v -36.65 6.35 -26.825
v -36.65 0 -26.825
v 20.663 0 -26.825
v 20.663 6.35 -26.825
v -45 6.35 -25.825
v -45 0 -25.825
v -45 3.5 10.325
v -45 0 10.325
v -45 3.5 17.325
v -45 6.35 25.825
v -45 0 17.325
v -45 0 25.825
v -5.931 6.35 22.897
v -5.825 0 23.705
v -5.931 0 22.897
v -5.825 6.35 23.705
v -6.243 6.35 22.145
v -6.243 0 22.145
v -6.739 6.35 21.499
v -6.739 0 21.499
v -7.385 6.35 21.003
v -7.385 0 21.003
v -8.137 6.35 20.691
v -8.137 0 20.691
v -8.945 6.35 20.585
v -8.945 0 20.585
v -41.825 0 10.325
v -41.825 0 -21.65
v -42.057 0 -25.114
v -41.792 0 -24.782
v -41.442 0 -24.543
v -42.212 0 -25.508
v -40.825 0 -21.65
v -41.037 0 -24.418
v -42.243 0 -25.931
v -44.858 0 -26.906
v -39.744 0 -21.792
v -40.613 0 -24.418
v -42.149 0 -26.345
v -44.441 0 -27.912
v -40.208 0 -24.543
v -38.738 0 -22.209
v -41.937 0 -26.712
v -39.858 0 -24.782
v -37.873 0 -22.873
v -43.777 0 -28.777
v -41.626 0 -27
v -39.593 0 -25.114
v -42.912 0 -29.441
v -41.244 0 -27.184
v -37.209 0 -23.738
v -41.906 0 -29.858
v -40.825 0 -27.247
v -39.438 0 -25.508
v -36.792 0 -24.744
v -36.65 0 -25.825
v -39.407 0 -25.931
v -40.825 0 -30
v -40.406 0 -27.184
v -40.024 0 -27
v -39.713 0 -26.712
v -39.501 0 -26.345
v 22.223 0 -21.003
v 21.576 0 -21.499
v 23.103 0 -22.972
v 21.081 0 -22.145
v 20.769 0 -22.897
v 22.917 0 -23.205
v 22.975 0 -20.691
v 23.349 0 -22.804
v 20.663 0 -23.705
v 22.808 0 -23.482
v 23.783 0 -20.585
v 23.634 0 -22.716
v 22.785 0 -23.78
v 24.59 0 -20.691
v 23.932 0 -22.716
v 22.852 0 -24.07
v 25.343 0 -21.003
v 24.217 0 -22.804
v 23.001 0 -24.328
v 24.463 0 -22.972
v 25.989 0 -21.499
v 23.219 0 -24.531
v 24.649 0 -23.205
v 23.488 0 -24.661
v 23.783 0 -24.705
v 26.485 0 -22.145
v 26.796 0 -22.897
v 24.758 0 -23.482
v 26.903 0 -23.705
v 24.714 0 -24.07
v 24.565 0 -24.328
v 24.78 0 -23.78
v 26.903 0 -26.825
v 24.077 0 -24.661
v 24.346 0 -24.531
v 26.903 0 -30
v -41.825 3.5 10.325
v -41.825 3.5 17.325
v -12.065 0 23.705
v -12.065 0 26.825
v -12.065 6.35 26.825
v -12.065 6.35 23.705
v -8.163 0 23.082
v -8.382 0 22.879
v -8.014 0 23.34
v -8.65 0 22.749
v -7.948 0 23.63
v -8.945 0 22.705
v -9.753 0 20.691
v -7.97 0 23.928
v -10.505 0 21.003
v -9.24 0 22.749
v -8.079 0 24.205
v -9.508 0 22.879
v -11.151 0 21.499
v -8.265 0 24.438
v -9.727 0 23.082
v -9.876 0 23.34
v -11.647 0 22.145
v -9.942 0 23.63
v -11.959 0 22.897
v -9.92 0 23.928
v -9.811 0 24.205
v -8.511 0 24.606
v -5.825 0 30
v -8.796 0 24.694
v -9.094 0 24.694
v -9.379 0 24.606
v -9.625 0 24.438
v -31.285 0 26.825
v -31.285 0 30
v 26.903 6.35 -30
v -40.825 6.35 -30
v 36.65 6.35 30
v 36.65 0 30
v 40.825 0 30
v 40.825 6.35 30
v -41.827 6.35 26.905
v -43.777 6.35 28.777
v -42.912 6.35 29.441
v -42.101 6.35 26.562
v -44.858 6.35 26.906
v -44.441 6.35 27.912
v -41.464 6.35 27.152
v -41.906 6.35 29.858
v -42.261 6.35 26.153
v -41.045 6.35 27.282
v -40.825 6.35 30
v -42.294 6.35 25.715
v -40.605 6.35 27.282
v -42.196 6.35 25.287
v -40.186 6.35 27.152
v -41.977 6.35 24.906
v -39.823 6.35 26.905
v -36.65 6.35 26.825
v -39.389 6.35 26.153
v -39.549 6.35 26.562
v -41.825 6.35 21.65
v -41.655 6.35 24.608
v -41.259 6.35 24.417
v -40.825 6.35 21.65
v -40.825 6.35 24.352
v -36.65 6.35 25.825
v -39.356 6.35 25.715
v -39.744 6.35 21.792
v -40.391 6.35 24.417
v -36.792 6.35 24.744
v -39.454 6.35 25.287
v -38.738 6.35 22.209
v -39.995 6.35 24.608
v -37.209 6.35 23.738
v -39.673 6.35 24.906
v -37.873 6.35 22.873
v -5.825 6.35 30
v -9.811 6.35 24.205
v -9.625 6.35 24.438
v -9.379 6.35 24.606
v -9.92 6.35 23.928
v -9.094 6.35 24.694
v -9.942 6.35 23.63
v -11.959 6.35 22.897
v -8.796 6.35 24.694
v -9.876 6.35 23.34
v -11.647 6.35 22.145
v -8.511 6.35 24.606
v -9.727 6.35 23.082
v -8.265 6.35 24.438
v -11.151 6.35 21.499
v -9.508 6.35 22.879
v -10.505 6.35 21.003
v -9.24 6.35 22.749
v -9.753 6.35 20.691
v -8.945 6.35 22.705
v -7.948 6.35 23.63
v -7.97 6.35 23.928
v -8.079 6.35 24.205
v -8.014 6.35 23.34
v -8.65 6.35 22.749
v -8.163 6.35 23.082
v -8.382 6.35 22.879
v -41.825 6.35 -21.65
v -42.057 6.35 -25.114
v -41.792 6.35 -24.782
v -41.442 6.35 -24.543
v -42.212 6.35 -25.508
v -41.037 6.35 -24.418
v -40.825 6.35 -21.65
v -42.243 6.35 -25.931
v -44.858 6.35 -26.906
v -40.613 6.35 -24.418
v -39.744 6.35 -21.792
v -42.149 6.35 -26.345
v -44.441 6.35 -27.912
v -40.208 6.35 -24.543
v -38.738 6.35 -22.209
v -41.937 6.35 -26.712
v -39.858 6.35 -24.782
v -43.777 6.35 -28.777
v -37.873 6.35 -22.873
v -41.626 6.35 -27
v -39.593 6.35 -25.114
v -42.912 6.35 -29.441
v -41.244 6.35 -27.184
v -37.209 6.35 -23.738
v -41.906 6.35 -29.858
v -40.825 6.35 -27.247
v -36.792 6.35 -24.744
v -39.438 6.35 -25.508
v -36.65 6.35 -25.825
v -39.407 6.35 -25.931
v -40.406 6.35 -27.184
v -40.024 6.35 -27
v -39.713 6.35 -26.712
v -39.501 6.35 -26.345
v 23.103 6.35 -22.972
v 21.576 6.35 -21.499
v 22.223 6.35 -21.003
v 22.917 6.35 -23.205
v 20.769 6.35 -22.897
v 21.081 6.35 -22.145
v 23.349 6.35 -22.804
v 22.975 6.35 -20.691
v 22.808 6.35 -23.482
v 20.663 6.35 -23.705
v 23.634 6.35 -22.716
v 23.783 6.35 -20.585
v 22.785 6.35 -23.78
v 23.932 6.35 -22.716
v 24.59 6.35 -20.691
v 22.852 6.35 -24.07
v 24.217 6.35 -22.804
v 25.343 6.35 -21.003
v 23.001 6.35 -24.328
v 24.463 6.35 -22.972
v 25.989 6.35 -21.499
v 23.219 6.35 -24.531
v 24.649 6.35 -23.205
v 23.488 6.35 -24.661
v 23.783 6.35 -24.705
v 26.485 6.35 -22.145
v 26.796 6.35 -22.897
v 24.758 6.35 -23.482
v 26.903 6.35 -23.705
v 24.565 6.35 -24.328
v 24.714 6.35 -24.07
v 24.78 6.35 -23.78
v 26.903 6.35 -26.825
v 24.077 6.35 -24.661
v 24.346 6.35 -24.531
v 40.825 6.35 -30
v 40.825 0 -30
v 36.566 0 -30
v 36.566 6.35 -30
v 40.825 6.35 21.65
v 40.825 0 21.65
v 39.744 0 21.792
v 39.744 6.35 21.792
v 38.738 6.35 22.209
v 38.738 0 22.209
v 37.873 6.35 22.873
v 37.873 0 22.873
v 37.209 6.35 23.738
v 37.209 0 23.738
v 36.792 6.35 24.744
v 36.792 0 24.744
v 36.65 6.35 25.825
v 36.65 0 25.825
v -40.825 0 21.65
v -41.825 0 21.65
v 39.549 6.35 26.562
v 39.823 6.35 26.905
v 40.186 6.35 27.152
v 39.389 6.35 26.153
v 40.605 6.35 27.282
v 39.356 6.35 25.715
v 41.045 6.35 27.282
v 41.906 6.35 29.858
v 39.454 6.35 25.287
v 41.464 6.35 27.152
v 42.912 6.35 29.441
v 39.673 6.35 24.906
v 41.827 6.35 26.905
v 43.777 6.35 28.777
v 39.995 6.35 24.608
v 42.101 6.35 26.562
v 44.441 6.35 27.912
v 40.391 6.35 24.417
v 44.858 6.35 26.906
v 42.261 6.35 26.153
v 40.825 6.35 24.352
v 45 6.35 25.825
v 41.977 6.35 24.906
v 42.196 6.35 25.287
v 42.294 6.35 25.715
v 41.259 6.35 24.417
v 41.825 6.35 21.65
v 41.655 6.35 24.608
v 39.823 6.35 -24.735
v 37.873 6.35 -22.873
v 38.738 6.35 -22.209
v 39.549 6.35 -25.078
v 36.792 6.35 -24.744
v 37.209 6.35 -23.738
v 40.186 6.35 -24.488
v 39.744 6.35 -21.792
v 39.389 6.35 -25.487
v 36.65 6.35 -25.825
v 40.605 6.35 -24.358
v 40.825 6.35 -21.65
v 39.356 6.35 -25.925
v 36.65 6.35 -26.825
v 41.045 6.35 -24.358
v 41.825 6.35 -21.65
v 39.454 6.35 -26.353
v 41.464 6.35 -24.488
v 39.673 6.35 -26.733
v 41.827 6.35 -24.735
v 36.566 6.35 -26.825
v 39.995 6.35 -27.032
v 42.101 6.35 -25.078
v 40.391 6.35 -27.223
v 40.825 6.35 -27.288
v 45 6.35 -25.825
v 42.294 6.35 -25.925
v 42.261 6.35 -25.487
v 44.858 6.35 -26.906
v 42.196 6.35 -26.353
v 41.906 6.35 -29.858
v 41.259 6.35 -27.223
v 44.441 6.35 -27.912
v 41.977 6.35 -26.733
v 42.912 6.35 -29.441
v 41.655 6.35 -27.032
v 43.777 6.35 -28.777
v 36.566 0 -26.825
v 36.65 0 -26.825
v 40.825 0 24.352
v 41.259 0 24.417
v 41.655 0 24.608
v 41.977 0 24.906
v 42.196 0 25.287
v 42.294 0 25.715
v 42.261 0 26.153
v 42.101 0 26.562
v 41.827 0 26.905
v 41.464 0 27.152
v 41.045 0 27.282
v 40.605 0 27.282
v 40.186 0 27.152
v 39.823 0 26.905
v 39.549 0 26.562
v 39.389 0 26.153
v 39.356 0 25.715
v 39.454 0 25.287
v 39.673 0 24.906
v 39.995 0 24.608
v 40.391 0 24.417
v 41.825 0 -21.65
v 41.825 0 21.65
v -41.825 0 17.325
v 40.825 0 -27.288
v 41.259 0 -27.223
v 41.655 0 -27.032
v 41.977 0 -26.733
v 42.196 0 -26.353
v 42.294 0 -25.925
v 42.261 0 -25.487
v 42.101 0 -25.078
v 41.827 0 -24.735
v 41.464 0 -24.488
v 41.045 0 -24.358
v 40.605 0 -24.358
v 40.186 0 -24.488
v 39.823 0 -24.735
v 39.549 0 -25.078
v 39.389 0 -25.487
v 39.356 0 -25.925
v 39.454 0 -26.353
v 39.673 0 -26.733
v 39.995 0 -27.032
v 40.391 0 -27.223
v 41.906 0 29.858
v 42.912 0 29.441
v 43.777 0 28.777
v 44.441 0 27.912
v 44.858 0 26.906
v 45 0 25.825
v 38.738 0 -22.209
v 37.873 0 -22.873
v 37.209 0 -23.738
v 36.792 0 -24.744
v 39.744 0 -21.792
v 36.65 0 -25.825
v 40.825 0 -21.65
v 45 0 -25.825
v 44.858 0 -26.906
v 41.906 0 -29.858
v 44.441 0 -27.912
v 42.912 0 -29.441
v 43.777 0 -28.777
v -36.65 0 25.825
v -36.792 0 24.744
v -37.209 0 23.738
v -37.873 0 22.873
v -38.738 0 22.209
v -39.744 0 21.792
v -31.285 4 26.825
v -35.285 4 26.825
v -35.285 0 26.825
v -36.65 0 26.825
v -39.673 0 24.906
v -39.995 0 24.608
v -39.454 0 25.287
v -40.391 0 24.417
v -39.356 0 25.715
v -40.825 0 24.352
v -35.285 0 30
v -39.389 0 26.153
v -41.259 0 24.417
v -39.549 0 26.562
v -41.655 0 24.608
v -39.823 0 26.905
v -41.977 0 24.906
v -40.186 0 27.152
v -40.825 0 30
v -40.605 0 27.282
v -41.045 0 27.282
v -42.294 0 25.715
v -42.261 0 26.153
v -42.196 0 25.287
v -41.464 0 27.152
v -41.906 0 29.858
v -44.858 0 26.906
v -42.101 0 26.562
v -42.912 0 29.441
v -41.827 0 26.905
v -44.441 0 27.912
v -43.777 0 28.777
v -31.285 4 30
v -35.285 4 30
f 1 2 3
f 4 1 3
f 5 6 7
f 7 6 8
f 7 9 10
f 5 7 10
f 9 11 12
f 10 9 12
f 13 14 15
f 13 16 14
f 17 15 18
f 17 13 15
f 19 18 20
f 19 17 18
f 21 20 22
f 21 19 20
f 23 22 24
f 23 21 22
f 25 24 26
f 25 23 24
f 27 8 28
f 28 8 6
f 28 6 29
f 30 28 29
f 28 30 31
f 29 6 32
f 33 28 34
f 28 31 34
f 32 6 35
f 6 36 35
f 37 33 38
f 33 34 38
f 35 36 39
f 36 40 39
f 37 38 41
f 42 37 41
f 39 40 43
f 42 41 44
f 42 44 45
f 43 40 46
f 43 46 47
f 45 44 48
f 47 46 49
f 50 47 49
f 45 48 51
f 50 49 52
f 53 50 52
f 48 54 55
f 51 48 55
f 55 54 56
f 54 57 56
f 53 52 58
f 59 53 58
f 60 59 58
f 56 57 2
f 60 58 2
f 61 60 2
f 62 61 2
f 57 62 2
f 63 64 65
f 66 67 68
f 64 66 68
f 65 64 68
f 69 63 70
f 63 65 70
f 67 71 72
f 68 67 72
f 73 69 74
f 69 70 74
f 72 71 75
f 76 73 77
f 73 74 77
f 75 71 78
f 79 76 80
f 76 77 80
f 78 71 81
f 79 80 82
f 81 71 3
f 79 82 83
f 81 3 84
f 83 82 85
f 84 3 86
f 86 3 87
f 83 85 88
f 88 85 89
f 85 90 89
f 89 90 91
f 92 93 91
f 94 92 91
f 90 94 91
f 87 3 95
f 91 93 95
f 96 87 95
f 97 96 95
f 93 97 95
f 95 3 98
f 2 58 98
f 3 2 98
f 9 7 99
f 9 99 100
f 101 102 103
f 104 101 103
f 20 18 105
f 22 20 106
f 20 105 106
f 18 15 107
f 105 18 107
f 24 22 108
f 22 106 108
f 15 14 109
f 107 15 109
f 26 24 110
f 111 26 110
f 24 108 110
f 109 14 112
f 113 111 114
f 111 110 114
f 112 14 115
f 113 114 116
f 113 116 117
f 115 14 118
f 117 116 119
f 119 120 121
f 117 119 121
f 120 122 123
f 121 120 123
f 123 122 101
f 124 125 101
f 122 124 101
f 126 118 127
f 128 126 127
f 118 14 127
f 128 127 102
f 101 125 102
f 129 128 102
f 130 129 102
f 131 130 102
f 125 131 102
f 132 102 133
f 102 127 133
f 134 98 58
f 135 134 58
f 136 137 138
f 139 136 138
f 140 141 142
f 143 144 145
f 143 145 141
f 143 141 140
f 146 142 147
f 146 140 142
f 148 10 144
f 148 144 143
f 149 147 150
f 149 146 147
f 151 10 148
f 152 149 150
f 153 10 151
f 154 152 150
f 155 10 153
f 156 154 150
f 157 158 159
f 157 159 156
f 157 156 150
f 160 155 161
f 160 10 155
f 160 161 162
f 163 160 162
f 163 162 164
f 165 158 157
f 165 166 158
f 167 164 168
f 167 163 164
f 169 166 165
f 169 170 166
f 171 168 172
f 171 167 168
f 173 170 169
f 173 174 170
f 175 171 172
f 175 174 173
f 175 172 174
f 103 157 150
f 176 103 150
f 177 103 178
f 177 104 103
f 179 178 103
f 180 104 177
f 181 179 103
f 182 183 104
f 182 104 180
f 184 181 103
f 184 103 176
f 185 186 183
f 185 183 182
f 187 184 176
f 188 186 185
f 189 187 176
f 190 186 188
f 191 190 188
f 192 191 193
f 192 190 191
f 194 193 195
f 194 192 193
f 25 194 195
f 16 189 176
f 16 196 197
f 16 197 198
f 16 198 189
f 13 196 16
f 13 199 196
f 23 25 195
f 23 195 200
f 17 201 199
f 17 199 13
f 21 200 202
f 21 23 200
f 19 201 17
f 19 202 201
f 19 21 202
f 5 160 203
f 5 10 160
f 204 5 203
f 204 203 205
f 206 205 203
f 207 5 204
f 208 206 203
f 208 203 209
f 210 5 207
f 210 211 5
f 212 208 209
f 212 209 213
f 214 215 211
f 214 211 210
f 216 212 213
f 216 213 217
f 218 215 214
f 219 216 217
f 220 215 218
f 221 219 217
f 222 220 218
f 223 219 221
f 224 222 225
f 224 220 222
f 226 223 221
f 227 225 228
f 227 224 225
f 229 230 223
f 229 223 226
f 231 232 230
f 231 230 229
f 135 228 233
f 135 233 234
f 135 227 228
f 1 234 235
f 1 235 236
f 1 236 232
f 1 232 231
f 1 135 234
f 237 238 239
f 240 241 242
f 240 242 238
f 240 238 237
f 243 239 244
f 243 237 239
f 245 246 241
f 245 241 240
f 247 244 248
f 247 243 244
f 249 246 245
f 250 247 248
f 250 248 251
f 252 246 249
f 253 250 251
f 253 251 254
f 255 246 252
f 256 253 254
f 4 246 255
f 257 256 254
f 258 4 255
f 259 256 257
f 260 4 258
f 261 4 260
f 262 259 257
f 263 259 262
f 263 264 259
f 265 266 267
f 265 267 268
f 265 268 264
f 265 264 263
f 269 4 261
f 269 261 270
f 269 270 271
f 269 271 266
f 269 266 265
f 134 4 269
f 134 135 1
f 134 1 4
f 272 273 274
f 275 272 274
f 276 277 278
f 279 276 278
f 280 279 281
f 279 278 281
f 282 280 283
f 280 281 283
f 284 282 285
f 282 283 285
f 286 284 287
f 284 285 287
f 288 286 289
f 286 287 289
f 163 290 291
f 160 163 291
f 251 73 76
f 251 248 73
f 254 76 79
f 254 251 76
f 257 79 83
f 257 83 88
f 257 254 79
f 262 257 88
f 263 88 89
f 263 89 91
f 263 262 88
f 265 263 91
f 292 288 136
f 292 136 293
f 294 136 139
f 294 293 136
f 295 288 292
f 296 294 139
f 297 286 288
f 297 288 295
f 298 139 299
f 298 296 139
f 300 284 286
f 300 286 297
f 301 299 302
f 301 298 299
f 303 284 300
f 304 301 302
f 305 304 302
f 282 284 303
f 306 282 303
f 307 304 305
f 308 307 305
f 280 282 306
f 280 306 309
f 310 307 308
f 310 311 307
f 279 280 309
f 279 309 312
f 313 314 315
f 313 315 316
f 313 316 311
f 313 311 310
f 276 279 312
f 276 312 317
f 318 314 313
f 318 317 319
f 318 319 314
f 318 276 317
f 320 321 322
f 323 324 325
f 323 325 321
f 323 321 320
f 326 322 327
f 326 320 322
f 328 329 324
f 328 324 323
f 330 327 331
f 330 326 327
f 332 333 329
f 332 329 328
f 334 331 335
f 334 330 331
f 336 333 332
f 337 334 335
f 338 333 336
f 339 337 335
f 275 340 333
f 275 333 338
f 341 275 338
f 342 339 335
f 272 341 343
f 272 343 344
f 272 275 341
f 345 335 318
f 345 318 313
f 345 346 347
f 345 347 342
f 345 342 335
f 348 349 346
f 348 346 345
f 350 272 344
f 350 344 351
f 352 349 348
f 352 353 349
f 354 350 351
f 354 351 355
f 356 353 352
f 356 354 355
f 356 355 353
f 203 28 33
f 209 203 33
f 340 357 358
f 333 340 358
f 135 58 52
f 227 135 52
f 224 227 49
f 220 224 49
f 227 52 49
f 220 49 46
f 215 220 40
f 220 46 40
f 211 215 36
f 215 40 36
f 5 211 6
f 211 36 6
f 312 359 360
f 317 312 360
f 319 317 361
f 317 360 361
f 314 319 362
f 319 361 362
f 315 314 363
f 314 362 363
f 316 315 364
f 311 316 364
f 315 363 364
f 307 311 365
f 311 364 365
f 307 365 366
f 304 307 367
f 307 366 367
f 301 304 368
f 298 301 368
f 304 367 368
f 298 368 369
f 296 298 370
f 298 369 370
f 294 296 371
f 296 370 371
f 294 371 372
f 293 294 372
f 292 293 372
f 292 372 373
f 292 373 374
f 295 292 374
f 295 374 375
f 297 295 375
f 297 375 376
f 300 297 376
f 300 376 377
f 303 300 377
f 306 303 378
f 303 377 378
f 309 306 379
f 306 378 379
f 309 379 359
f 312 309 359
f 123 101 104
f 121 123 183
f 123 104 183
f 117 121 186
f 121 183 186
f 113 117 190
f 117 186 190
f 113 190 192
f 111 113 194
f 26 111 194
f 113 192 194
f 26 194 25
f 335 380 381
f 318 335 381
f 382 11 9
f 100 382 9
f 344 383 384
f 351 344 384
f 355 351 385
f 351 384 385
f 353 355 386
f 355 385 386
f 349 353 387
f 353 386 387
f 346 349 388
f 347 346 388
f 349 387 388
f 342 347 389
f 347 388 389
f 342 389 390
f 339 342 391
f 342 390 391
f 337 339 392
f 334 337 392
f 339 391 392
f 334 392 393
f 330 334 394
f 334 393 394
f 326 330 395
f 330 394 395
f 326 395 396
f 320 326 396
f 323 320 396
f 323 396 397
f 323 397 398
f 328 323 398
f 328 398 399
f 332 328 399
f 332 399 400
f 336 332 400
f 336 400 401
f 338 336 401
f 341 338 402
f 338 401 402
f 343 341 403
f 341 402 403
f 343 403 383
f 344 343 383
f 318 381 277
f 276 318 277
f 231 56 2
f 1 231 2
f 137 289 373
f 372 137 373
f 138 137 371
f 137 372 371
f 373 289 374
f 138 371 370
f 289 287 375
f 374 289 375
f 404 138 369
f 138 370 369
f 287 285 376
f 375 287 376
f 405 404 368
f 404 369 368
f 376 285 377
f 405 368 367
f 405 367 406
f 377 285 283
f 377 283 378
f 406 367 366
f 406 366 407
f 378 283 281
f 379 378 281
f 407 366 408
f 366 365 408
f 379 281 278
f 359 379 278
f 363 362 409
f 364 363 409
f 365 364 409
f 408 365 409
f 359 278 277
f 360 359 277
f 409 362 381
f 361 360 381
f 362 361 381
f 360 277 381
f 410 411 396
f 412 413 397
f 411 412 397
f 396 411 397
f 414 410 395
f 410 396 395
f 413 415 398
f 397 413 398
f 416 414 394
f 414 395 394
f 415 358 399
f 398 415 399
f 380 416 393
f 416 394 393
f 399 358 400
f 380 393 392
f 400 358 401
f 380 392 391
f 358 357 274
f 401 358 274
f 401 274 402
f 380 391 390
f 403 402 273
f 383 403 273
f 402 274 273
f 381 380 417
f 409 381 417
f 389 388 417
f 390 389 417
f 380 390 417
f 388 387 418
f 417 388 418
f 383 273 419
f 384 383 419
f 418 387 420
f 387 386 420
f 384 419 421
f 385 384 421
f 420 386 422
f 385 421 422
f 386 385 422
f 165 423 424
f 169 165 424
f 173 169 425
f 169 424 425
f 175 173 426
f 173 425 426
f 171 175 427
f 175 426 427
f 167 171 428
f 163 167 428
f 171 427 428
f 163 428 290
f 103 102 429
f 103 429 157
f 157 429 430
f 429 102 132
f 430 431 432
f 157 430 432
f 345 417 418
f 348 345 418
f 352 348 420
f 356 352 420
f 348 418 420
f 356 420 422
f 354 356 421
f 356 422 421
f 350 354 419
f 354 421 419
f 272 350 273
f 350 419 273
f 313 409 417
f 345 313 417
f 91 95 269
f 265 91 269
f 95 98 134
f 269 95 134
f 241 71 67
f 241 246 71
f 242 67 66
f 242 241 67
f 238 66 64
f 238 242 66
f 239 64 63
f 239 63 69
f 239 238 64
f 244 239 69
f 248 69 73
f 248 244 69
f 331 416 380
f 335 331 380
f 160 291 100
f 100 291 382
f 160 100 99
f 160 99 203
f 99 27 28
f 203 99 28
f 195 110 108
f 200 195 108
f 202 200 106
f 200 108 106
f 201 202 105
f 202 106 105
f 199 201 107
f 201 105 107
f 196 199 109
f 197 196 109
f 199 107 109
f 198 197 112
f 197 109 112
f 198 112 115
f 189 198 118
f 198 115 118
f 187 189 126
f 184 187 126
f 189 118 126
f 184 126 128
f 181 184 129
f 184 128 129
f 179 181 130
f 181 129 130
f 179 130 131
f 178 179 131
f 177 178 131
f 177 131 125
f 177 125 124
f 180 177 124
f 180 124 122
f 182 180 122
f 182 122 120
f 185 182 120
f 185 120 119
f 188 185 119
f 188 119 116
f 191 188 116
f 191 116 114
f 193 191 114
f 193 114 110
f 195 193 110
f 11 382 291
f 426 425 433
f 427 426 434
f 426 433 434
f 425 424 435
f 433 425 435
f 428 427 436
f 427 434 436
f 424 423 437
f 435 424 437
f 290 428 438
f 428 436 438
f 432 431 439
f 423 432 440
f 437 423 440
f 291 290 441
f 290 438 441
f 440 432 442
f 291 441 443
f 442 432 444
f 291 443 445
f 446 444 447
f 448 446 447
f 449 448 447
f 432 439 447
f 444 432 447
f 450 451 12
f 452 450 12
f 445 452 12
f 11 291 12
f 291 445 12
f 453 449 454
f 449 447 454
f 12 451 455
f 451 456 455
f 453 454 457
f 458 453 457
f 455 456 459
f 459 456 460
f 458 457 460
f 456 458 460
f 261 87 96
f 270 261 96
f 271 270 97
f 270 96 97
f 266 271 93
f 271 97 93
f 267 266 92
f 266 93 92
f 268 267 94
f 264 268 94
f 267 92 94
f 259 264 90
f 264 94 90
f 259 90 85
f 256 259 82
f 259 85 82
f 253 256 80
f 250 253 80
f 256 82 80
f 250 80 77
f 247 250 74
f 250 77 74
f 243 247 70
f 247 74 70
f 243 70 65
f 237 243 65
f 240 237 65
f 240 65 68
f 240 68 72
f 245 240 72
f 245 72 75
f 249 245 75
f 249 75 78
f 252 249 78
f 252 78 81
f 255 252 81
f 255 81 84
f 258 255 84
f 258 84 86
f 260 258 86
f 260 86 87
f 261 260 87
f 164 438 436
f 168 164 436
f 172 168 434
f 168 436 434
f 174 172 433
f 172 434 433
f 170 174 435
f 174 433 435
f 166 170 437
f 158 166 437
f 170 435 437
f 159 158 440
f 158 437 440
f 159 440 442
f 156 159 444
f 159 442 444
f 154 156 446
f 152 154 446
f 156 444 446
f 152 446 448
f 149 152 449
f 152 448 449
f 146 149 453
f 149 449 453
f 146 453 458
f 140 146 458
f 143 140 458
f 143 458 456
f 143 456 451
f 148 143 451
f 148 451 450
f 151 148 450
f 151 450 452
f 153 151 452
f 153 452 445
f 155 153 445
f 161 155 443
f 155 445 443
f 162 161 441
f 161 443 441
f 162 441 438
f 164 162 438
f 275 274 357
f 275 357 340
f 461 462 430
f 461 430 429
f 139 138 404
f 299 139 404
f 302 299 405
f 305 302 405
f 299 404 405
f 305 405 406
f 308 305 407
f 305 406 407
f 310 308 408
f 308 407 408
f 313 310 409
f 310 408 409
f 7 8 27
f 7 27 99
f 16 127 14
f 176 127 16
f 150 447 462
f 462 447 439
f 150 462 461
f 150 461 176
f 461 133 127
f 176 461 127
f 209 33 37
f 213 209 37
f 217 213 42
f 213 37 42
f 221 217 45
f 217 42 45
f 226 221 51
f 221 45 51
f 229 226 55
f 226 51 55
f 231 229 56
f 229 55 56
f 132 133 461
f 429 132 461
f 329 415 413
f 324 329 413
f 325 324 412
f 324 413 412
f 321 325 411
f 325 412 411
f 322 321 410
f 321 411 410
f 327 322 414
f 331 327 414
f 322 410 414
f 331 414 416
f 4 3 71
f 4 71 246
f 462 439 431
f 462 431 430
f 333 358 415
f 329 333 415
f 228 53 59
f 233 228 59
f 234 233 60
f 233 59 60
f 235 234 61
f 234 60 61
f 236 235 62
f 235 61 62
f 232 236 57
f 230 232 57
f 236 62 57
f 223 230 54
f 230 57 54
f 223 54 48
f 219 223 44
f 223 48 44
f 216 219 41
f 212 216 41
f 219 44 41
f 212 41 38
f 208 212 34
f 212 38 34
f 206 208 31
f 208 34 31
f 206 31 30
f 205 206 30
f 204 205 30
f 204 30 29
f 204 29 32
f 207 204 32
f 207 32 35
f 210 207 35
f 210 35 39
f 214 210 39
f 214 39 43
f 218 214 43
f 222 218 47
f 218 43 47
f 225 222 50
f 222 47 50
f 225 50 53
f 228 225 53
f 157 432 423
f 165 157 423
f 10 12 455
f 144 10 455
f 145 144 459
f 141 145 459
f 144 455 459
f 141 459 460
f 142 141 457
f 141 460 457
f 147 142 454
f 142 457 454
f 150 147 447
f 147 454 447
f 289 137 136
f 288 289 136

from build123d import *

# Parameters (mm, degrees)
BOSS_EXTRUDE3_DEPTH = 6.35
SKETCH3_W           = 9.663283239
SKETCH3_H           = 6.35
CUT_EXTRUDE1_DEPTH  = 3.175
SKETCH4_W           = 42.475
SKETCH4_H           = 6.35
CUT_EXTRUDE2_DEPTH  = 8.35
SKETCH5_W           = 7
SKETCH5_H           = 7
CUT_EXTRUDE3_DEPTH  = 3.175
SKETCH6_R           = 1.4732
CUT_EXTRUDE4_DEPTH  = 6.35
SKETCH7_R           = 1.4224
SKETCH7_R_2         = 1.4732
CUT_EXTRUDE5_DEPTH  = 6.35
SKETCH8_W           = 6.24
SKETCH8_H           = 6.35
BOSS_EXTRUDE4_DEPTH = 6.24
SKETCH9_W           = 6.24
SKETCH9_H           = 6.35
BOSS_EXTRUDE5_DEPTH = 6.24
SKETCH10_R          = 1
CUT_EXTRUDE6_DEPTH  = 55.454774814
FILLET1_R           = 3.12
SKETCH11_W          = 4
SKETCH11_H          = 4
CUT_EXTRUDE7_DEPTH  = 10


with BuildPart() as part:
    # Sketch2 → Boss-Extrude3 (new body)
    with BuildSketch(Plane(origin=(0, 0, 0), x_dir=(1, 0, 0), z_dir=(0, 1, 0))):
        with BuildLine():
            Line((-45, 25.825), (-45, -25.825))
            ThreePointArc((-45, -25.825), (-43.777170811, -28.777170811), (-40.825, -30))
            Line((-40.825, -30), (40.825, -30))
            ThreePointArc((40.825, -30), (43.777170811, -28.777170811), (45, -25.825))
            Line((45, -25.825), (45, 25.825))
            ThreePointArc((45, 25.825), (43.777170811, 28.777170811), (40.825, 30))
            Line((40.825, 30), (-40.825, 30))
            ThreePointArc((-40.825, 30), (-43.777170811, 28.777170811), (-45, 25.825))
        make_face()
        with BuildLine():
            Line((40.825, 21.65), (41.825, 21.65))
            Line((41.825, 21.65), (41.825, -21.65))
            Line((41.825, -21.65), (40.825, -21.65))
            ThreePointArc((40.825, -21.65), (37.872829189, -22.872829189), (36.65, -25.825))
            Line((36.65, -25.825), (36.65, -26.825))
            Line((36.65, -26.825), (-36.65, -26.825))
            Line((-36.65, -26.825), (-36.65, -25.825))
            ThreePointArc((-36.65, -25.825), (-37.872829189, -22.872829189), (-40.825, -21.65))
            Line((-40.825, -21.65), (-41.825, -21.65))
            Line((-41.825, -21.65), (-41.825, 21.65))
            Line((-41.825, 21.65), (-40.825, 21.65))
            ThreePointArc((-40.825, 21.65), (-37.872829189, 22.872829189), (-36.65, 25.825))
            Line((-36.65, 25.825), (-36.65, 26.825))
            Line((-36.65, 26.825), (36.65, 26.825))
            Line((36.65, 26.825), (36.65, 25.825))
            ThreePointArc((36.65, 25.825), (37.872829189, 22.872829189), (40.825, 21.65))
        make_face(mode=Mode.SUBTRACT)
    extrude(amount=BOSS_EXTRUDE3_DEPTH)

    # Sketch3 → Cut-Extrude1 (cut)
    with BuildSketch(Plane(origin=(0, 0, -30), x_dir=(-1, 0, 0), z_dir=(0, 0, -1))):
        with Locations((-31.734329903, 3.175)):
            Rectangle(SKETCH3_W, SKETCH3_H)
    extrude(amount=-CUT_EXTRUDE1_DEPTH, mode=Mode.SUBTRACT)

    # Sketch4 → Cut-Extrude2 (cut)
    with BuildSketch(Plane.XY.offset(30)):
        with Locations((15.4125, 3.175)):
            Rectangle(SKETCH4_W, SKETCH4_H)
    extrude(amount=-CUT_EXTRUDE2_DEPTH, mode=Mode.SUBTRACT)


with BuildPart() as cut_extrude2_piece_1:
    # of the separate pieces the step leaves, piece 1, a body of its own (cut_extrude2_pieces)
    add(part.part.solids().sort_by_distance((-40.825, 0, 30))[0])

    # Sketch5 → Cut-Extrude3 (cut)
    with BuildSketch(Plane.ZY.offset(45)):
        with Locations((13.825, 0)):
            Rectangle(SKETCH5_W, SKETCH5_H)
    extrude(amount=-CUT_EXTRUDE3_DEPTH, mode=Mode.SUBTRACT)

    # Sketch7 → Cut-Extrude5 (cut)
    with BuildSketch(Plane.XZ):
        with Locations(Location((-40.825, -25.825, 0), (0, 0, 270))):
            Circle(SKETCH7_R)
        with Locations(Location((-40.825, 25.825, 0), (0, 0, 270))):
            Circle(SKETCH7_R_2)
    extrude(amount=-CUT_EXTRUDE5_DEPTH, mode=Mode.SUBTRACT)

    # Sketch8 → Boss-Extrude4 (add)
    with BuildSketch(Plane(origin=(0, 0, 26.825), x_dir=(-1, 0, 0), z_dir=(0, 0, -1))):
        with Locations((8.945, 3.175)):
            Rectangle(SKETCH8_W, SKETCH8_H)
    extrude(amount=BOSS_EXTRUDE4_DEPTH)

    # Sketch9 → Boss-Extrude5 (add)
    with BuildSketch(Plane.XY.offset(-26.825)):
        with Locations((23.782688283, 3.175)):
            Rectangle(SKETCH9_W, SKETCH9_H)
    extrude(amount=BOSS_EXTRUDE5_DEPTH)

    # Sketch10 → Cut-Extrude6 (cut, through all)
    with BuildSketch(Plane(origin=(0, 0, 0), x_dir=(-1, 0, 0), z_dir=(0, -1, 0))):
        with Locations(Location((-23.782688283, 23.705, 0), (0, 0, 90))):
            Circle(SKETCH10_R)
        with Locations(Location((8.945, -23.705, 0), (0, 0, 90))):
            Circle(SKETCH10_R)
    extrude(amount=-CUT_EXTRUDE6_DEPTH, mode=Mode.SUBTRACT)

    # Fillet1
    fillet1_edges = [cut_extrude2_piece_1.edges().sort_by_distance(p)[0] for p in [
        (-12.065, 3.175, 20.585),
        (-5.825, 3.175, 20.585),
        (26.902688283, 3.175, -20.585),
        (20.662688283, 3.175, -20.585),
    ]]
    fillet(fillet1_edges, radius=FILLET1_R - 0.0001)  # a hair under: the kernel refuses the full size

    # Sketch11 → Cut-Extrude7 (cut)
    with BuildSketch(Plane.XY.offset(30)):
        with Locations((-33.285, 2)):
            Rectangle(SKETCH11_W, SKETCH11_H)
    extrude(amount=-CUT_EXTRUDE7_DEPTH, mode=Mode.SUBTRACT)


with BuildPart() as cut_extrude2_piece_2:
    # of the separate pieces the step leaves, piece 2, a body of its own (cut_extrude2_pieces)
    add(part.part.solids().sort_by_distance((40.825, 0, -30))[0])

    # Sketch6 → Cut-Extrude4 (cut)
    with BuildSketch(Plane.XZ):
        with Locations(Location((40.825, 25.825, 0), (0, 0, 270))):
            Circle(SKETCH6_R)
        with Locations(Location((40.825, -25.81487963, 0), (0, 0, 270))):
            Circle(SKETCH6_R)
    extrude(amount=-CUT_EXTRUDE4_DEPTH, mode=Mode.SUBTRACT)


solid = Compound([cut_extrude2_piece_1.part, cut_extrude2_piece_2.part])
